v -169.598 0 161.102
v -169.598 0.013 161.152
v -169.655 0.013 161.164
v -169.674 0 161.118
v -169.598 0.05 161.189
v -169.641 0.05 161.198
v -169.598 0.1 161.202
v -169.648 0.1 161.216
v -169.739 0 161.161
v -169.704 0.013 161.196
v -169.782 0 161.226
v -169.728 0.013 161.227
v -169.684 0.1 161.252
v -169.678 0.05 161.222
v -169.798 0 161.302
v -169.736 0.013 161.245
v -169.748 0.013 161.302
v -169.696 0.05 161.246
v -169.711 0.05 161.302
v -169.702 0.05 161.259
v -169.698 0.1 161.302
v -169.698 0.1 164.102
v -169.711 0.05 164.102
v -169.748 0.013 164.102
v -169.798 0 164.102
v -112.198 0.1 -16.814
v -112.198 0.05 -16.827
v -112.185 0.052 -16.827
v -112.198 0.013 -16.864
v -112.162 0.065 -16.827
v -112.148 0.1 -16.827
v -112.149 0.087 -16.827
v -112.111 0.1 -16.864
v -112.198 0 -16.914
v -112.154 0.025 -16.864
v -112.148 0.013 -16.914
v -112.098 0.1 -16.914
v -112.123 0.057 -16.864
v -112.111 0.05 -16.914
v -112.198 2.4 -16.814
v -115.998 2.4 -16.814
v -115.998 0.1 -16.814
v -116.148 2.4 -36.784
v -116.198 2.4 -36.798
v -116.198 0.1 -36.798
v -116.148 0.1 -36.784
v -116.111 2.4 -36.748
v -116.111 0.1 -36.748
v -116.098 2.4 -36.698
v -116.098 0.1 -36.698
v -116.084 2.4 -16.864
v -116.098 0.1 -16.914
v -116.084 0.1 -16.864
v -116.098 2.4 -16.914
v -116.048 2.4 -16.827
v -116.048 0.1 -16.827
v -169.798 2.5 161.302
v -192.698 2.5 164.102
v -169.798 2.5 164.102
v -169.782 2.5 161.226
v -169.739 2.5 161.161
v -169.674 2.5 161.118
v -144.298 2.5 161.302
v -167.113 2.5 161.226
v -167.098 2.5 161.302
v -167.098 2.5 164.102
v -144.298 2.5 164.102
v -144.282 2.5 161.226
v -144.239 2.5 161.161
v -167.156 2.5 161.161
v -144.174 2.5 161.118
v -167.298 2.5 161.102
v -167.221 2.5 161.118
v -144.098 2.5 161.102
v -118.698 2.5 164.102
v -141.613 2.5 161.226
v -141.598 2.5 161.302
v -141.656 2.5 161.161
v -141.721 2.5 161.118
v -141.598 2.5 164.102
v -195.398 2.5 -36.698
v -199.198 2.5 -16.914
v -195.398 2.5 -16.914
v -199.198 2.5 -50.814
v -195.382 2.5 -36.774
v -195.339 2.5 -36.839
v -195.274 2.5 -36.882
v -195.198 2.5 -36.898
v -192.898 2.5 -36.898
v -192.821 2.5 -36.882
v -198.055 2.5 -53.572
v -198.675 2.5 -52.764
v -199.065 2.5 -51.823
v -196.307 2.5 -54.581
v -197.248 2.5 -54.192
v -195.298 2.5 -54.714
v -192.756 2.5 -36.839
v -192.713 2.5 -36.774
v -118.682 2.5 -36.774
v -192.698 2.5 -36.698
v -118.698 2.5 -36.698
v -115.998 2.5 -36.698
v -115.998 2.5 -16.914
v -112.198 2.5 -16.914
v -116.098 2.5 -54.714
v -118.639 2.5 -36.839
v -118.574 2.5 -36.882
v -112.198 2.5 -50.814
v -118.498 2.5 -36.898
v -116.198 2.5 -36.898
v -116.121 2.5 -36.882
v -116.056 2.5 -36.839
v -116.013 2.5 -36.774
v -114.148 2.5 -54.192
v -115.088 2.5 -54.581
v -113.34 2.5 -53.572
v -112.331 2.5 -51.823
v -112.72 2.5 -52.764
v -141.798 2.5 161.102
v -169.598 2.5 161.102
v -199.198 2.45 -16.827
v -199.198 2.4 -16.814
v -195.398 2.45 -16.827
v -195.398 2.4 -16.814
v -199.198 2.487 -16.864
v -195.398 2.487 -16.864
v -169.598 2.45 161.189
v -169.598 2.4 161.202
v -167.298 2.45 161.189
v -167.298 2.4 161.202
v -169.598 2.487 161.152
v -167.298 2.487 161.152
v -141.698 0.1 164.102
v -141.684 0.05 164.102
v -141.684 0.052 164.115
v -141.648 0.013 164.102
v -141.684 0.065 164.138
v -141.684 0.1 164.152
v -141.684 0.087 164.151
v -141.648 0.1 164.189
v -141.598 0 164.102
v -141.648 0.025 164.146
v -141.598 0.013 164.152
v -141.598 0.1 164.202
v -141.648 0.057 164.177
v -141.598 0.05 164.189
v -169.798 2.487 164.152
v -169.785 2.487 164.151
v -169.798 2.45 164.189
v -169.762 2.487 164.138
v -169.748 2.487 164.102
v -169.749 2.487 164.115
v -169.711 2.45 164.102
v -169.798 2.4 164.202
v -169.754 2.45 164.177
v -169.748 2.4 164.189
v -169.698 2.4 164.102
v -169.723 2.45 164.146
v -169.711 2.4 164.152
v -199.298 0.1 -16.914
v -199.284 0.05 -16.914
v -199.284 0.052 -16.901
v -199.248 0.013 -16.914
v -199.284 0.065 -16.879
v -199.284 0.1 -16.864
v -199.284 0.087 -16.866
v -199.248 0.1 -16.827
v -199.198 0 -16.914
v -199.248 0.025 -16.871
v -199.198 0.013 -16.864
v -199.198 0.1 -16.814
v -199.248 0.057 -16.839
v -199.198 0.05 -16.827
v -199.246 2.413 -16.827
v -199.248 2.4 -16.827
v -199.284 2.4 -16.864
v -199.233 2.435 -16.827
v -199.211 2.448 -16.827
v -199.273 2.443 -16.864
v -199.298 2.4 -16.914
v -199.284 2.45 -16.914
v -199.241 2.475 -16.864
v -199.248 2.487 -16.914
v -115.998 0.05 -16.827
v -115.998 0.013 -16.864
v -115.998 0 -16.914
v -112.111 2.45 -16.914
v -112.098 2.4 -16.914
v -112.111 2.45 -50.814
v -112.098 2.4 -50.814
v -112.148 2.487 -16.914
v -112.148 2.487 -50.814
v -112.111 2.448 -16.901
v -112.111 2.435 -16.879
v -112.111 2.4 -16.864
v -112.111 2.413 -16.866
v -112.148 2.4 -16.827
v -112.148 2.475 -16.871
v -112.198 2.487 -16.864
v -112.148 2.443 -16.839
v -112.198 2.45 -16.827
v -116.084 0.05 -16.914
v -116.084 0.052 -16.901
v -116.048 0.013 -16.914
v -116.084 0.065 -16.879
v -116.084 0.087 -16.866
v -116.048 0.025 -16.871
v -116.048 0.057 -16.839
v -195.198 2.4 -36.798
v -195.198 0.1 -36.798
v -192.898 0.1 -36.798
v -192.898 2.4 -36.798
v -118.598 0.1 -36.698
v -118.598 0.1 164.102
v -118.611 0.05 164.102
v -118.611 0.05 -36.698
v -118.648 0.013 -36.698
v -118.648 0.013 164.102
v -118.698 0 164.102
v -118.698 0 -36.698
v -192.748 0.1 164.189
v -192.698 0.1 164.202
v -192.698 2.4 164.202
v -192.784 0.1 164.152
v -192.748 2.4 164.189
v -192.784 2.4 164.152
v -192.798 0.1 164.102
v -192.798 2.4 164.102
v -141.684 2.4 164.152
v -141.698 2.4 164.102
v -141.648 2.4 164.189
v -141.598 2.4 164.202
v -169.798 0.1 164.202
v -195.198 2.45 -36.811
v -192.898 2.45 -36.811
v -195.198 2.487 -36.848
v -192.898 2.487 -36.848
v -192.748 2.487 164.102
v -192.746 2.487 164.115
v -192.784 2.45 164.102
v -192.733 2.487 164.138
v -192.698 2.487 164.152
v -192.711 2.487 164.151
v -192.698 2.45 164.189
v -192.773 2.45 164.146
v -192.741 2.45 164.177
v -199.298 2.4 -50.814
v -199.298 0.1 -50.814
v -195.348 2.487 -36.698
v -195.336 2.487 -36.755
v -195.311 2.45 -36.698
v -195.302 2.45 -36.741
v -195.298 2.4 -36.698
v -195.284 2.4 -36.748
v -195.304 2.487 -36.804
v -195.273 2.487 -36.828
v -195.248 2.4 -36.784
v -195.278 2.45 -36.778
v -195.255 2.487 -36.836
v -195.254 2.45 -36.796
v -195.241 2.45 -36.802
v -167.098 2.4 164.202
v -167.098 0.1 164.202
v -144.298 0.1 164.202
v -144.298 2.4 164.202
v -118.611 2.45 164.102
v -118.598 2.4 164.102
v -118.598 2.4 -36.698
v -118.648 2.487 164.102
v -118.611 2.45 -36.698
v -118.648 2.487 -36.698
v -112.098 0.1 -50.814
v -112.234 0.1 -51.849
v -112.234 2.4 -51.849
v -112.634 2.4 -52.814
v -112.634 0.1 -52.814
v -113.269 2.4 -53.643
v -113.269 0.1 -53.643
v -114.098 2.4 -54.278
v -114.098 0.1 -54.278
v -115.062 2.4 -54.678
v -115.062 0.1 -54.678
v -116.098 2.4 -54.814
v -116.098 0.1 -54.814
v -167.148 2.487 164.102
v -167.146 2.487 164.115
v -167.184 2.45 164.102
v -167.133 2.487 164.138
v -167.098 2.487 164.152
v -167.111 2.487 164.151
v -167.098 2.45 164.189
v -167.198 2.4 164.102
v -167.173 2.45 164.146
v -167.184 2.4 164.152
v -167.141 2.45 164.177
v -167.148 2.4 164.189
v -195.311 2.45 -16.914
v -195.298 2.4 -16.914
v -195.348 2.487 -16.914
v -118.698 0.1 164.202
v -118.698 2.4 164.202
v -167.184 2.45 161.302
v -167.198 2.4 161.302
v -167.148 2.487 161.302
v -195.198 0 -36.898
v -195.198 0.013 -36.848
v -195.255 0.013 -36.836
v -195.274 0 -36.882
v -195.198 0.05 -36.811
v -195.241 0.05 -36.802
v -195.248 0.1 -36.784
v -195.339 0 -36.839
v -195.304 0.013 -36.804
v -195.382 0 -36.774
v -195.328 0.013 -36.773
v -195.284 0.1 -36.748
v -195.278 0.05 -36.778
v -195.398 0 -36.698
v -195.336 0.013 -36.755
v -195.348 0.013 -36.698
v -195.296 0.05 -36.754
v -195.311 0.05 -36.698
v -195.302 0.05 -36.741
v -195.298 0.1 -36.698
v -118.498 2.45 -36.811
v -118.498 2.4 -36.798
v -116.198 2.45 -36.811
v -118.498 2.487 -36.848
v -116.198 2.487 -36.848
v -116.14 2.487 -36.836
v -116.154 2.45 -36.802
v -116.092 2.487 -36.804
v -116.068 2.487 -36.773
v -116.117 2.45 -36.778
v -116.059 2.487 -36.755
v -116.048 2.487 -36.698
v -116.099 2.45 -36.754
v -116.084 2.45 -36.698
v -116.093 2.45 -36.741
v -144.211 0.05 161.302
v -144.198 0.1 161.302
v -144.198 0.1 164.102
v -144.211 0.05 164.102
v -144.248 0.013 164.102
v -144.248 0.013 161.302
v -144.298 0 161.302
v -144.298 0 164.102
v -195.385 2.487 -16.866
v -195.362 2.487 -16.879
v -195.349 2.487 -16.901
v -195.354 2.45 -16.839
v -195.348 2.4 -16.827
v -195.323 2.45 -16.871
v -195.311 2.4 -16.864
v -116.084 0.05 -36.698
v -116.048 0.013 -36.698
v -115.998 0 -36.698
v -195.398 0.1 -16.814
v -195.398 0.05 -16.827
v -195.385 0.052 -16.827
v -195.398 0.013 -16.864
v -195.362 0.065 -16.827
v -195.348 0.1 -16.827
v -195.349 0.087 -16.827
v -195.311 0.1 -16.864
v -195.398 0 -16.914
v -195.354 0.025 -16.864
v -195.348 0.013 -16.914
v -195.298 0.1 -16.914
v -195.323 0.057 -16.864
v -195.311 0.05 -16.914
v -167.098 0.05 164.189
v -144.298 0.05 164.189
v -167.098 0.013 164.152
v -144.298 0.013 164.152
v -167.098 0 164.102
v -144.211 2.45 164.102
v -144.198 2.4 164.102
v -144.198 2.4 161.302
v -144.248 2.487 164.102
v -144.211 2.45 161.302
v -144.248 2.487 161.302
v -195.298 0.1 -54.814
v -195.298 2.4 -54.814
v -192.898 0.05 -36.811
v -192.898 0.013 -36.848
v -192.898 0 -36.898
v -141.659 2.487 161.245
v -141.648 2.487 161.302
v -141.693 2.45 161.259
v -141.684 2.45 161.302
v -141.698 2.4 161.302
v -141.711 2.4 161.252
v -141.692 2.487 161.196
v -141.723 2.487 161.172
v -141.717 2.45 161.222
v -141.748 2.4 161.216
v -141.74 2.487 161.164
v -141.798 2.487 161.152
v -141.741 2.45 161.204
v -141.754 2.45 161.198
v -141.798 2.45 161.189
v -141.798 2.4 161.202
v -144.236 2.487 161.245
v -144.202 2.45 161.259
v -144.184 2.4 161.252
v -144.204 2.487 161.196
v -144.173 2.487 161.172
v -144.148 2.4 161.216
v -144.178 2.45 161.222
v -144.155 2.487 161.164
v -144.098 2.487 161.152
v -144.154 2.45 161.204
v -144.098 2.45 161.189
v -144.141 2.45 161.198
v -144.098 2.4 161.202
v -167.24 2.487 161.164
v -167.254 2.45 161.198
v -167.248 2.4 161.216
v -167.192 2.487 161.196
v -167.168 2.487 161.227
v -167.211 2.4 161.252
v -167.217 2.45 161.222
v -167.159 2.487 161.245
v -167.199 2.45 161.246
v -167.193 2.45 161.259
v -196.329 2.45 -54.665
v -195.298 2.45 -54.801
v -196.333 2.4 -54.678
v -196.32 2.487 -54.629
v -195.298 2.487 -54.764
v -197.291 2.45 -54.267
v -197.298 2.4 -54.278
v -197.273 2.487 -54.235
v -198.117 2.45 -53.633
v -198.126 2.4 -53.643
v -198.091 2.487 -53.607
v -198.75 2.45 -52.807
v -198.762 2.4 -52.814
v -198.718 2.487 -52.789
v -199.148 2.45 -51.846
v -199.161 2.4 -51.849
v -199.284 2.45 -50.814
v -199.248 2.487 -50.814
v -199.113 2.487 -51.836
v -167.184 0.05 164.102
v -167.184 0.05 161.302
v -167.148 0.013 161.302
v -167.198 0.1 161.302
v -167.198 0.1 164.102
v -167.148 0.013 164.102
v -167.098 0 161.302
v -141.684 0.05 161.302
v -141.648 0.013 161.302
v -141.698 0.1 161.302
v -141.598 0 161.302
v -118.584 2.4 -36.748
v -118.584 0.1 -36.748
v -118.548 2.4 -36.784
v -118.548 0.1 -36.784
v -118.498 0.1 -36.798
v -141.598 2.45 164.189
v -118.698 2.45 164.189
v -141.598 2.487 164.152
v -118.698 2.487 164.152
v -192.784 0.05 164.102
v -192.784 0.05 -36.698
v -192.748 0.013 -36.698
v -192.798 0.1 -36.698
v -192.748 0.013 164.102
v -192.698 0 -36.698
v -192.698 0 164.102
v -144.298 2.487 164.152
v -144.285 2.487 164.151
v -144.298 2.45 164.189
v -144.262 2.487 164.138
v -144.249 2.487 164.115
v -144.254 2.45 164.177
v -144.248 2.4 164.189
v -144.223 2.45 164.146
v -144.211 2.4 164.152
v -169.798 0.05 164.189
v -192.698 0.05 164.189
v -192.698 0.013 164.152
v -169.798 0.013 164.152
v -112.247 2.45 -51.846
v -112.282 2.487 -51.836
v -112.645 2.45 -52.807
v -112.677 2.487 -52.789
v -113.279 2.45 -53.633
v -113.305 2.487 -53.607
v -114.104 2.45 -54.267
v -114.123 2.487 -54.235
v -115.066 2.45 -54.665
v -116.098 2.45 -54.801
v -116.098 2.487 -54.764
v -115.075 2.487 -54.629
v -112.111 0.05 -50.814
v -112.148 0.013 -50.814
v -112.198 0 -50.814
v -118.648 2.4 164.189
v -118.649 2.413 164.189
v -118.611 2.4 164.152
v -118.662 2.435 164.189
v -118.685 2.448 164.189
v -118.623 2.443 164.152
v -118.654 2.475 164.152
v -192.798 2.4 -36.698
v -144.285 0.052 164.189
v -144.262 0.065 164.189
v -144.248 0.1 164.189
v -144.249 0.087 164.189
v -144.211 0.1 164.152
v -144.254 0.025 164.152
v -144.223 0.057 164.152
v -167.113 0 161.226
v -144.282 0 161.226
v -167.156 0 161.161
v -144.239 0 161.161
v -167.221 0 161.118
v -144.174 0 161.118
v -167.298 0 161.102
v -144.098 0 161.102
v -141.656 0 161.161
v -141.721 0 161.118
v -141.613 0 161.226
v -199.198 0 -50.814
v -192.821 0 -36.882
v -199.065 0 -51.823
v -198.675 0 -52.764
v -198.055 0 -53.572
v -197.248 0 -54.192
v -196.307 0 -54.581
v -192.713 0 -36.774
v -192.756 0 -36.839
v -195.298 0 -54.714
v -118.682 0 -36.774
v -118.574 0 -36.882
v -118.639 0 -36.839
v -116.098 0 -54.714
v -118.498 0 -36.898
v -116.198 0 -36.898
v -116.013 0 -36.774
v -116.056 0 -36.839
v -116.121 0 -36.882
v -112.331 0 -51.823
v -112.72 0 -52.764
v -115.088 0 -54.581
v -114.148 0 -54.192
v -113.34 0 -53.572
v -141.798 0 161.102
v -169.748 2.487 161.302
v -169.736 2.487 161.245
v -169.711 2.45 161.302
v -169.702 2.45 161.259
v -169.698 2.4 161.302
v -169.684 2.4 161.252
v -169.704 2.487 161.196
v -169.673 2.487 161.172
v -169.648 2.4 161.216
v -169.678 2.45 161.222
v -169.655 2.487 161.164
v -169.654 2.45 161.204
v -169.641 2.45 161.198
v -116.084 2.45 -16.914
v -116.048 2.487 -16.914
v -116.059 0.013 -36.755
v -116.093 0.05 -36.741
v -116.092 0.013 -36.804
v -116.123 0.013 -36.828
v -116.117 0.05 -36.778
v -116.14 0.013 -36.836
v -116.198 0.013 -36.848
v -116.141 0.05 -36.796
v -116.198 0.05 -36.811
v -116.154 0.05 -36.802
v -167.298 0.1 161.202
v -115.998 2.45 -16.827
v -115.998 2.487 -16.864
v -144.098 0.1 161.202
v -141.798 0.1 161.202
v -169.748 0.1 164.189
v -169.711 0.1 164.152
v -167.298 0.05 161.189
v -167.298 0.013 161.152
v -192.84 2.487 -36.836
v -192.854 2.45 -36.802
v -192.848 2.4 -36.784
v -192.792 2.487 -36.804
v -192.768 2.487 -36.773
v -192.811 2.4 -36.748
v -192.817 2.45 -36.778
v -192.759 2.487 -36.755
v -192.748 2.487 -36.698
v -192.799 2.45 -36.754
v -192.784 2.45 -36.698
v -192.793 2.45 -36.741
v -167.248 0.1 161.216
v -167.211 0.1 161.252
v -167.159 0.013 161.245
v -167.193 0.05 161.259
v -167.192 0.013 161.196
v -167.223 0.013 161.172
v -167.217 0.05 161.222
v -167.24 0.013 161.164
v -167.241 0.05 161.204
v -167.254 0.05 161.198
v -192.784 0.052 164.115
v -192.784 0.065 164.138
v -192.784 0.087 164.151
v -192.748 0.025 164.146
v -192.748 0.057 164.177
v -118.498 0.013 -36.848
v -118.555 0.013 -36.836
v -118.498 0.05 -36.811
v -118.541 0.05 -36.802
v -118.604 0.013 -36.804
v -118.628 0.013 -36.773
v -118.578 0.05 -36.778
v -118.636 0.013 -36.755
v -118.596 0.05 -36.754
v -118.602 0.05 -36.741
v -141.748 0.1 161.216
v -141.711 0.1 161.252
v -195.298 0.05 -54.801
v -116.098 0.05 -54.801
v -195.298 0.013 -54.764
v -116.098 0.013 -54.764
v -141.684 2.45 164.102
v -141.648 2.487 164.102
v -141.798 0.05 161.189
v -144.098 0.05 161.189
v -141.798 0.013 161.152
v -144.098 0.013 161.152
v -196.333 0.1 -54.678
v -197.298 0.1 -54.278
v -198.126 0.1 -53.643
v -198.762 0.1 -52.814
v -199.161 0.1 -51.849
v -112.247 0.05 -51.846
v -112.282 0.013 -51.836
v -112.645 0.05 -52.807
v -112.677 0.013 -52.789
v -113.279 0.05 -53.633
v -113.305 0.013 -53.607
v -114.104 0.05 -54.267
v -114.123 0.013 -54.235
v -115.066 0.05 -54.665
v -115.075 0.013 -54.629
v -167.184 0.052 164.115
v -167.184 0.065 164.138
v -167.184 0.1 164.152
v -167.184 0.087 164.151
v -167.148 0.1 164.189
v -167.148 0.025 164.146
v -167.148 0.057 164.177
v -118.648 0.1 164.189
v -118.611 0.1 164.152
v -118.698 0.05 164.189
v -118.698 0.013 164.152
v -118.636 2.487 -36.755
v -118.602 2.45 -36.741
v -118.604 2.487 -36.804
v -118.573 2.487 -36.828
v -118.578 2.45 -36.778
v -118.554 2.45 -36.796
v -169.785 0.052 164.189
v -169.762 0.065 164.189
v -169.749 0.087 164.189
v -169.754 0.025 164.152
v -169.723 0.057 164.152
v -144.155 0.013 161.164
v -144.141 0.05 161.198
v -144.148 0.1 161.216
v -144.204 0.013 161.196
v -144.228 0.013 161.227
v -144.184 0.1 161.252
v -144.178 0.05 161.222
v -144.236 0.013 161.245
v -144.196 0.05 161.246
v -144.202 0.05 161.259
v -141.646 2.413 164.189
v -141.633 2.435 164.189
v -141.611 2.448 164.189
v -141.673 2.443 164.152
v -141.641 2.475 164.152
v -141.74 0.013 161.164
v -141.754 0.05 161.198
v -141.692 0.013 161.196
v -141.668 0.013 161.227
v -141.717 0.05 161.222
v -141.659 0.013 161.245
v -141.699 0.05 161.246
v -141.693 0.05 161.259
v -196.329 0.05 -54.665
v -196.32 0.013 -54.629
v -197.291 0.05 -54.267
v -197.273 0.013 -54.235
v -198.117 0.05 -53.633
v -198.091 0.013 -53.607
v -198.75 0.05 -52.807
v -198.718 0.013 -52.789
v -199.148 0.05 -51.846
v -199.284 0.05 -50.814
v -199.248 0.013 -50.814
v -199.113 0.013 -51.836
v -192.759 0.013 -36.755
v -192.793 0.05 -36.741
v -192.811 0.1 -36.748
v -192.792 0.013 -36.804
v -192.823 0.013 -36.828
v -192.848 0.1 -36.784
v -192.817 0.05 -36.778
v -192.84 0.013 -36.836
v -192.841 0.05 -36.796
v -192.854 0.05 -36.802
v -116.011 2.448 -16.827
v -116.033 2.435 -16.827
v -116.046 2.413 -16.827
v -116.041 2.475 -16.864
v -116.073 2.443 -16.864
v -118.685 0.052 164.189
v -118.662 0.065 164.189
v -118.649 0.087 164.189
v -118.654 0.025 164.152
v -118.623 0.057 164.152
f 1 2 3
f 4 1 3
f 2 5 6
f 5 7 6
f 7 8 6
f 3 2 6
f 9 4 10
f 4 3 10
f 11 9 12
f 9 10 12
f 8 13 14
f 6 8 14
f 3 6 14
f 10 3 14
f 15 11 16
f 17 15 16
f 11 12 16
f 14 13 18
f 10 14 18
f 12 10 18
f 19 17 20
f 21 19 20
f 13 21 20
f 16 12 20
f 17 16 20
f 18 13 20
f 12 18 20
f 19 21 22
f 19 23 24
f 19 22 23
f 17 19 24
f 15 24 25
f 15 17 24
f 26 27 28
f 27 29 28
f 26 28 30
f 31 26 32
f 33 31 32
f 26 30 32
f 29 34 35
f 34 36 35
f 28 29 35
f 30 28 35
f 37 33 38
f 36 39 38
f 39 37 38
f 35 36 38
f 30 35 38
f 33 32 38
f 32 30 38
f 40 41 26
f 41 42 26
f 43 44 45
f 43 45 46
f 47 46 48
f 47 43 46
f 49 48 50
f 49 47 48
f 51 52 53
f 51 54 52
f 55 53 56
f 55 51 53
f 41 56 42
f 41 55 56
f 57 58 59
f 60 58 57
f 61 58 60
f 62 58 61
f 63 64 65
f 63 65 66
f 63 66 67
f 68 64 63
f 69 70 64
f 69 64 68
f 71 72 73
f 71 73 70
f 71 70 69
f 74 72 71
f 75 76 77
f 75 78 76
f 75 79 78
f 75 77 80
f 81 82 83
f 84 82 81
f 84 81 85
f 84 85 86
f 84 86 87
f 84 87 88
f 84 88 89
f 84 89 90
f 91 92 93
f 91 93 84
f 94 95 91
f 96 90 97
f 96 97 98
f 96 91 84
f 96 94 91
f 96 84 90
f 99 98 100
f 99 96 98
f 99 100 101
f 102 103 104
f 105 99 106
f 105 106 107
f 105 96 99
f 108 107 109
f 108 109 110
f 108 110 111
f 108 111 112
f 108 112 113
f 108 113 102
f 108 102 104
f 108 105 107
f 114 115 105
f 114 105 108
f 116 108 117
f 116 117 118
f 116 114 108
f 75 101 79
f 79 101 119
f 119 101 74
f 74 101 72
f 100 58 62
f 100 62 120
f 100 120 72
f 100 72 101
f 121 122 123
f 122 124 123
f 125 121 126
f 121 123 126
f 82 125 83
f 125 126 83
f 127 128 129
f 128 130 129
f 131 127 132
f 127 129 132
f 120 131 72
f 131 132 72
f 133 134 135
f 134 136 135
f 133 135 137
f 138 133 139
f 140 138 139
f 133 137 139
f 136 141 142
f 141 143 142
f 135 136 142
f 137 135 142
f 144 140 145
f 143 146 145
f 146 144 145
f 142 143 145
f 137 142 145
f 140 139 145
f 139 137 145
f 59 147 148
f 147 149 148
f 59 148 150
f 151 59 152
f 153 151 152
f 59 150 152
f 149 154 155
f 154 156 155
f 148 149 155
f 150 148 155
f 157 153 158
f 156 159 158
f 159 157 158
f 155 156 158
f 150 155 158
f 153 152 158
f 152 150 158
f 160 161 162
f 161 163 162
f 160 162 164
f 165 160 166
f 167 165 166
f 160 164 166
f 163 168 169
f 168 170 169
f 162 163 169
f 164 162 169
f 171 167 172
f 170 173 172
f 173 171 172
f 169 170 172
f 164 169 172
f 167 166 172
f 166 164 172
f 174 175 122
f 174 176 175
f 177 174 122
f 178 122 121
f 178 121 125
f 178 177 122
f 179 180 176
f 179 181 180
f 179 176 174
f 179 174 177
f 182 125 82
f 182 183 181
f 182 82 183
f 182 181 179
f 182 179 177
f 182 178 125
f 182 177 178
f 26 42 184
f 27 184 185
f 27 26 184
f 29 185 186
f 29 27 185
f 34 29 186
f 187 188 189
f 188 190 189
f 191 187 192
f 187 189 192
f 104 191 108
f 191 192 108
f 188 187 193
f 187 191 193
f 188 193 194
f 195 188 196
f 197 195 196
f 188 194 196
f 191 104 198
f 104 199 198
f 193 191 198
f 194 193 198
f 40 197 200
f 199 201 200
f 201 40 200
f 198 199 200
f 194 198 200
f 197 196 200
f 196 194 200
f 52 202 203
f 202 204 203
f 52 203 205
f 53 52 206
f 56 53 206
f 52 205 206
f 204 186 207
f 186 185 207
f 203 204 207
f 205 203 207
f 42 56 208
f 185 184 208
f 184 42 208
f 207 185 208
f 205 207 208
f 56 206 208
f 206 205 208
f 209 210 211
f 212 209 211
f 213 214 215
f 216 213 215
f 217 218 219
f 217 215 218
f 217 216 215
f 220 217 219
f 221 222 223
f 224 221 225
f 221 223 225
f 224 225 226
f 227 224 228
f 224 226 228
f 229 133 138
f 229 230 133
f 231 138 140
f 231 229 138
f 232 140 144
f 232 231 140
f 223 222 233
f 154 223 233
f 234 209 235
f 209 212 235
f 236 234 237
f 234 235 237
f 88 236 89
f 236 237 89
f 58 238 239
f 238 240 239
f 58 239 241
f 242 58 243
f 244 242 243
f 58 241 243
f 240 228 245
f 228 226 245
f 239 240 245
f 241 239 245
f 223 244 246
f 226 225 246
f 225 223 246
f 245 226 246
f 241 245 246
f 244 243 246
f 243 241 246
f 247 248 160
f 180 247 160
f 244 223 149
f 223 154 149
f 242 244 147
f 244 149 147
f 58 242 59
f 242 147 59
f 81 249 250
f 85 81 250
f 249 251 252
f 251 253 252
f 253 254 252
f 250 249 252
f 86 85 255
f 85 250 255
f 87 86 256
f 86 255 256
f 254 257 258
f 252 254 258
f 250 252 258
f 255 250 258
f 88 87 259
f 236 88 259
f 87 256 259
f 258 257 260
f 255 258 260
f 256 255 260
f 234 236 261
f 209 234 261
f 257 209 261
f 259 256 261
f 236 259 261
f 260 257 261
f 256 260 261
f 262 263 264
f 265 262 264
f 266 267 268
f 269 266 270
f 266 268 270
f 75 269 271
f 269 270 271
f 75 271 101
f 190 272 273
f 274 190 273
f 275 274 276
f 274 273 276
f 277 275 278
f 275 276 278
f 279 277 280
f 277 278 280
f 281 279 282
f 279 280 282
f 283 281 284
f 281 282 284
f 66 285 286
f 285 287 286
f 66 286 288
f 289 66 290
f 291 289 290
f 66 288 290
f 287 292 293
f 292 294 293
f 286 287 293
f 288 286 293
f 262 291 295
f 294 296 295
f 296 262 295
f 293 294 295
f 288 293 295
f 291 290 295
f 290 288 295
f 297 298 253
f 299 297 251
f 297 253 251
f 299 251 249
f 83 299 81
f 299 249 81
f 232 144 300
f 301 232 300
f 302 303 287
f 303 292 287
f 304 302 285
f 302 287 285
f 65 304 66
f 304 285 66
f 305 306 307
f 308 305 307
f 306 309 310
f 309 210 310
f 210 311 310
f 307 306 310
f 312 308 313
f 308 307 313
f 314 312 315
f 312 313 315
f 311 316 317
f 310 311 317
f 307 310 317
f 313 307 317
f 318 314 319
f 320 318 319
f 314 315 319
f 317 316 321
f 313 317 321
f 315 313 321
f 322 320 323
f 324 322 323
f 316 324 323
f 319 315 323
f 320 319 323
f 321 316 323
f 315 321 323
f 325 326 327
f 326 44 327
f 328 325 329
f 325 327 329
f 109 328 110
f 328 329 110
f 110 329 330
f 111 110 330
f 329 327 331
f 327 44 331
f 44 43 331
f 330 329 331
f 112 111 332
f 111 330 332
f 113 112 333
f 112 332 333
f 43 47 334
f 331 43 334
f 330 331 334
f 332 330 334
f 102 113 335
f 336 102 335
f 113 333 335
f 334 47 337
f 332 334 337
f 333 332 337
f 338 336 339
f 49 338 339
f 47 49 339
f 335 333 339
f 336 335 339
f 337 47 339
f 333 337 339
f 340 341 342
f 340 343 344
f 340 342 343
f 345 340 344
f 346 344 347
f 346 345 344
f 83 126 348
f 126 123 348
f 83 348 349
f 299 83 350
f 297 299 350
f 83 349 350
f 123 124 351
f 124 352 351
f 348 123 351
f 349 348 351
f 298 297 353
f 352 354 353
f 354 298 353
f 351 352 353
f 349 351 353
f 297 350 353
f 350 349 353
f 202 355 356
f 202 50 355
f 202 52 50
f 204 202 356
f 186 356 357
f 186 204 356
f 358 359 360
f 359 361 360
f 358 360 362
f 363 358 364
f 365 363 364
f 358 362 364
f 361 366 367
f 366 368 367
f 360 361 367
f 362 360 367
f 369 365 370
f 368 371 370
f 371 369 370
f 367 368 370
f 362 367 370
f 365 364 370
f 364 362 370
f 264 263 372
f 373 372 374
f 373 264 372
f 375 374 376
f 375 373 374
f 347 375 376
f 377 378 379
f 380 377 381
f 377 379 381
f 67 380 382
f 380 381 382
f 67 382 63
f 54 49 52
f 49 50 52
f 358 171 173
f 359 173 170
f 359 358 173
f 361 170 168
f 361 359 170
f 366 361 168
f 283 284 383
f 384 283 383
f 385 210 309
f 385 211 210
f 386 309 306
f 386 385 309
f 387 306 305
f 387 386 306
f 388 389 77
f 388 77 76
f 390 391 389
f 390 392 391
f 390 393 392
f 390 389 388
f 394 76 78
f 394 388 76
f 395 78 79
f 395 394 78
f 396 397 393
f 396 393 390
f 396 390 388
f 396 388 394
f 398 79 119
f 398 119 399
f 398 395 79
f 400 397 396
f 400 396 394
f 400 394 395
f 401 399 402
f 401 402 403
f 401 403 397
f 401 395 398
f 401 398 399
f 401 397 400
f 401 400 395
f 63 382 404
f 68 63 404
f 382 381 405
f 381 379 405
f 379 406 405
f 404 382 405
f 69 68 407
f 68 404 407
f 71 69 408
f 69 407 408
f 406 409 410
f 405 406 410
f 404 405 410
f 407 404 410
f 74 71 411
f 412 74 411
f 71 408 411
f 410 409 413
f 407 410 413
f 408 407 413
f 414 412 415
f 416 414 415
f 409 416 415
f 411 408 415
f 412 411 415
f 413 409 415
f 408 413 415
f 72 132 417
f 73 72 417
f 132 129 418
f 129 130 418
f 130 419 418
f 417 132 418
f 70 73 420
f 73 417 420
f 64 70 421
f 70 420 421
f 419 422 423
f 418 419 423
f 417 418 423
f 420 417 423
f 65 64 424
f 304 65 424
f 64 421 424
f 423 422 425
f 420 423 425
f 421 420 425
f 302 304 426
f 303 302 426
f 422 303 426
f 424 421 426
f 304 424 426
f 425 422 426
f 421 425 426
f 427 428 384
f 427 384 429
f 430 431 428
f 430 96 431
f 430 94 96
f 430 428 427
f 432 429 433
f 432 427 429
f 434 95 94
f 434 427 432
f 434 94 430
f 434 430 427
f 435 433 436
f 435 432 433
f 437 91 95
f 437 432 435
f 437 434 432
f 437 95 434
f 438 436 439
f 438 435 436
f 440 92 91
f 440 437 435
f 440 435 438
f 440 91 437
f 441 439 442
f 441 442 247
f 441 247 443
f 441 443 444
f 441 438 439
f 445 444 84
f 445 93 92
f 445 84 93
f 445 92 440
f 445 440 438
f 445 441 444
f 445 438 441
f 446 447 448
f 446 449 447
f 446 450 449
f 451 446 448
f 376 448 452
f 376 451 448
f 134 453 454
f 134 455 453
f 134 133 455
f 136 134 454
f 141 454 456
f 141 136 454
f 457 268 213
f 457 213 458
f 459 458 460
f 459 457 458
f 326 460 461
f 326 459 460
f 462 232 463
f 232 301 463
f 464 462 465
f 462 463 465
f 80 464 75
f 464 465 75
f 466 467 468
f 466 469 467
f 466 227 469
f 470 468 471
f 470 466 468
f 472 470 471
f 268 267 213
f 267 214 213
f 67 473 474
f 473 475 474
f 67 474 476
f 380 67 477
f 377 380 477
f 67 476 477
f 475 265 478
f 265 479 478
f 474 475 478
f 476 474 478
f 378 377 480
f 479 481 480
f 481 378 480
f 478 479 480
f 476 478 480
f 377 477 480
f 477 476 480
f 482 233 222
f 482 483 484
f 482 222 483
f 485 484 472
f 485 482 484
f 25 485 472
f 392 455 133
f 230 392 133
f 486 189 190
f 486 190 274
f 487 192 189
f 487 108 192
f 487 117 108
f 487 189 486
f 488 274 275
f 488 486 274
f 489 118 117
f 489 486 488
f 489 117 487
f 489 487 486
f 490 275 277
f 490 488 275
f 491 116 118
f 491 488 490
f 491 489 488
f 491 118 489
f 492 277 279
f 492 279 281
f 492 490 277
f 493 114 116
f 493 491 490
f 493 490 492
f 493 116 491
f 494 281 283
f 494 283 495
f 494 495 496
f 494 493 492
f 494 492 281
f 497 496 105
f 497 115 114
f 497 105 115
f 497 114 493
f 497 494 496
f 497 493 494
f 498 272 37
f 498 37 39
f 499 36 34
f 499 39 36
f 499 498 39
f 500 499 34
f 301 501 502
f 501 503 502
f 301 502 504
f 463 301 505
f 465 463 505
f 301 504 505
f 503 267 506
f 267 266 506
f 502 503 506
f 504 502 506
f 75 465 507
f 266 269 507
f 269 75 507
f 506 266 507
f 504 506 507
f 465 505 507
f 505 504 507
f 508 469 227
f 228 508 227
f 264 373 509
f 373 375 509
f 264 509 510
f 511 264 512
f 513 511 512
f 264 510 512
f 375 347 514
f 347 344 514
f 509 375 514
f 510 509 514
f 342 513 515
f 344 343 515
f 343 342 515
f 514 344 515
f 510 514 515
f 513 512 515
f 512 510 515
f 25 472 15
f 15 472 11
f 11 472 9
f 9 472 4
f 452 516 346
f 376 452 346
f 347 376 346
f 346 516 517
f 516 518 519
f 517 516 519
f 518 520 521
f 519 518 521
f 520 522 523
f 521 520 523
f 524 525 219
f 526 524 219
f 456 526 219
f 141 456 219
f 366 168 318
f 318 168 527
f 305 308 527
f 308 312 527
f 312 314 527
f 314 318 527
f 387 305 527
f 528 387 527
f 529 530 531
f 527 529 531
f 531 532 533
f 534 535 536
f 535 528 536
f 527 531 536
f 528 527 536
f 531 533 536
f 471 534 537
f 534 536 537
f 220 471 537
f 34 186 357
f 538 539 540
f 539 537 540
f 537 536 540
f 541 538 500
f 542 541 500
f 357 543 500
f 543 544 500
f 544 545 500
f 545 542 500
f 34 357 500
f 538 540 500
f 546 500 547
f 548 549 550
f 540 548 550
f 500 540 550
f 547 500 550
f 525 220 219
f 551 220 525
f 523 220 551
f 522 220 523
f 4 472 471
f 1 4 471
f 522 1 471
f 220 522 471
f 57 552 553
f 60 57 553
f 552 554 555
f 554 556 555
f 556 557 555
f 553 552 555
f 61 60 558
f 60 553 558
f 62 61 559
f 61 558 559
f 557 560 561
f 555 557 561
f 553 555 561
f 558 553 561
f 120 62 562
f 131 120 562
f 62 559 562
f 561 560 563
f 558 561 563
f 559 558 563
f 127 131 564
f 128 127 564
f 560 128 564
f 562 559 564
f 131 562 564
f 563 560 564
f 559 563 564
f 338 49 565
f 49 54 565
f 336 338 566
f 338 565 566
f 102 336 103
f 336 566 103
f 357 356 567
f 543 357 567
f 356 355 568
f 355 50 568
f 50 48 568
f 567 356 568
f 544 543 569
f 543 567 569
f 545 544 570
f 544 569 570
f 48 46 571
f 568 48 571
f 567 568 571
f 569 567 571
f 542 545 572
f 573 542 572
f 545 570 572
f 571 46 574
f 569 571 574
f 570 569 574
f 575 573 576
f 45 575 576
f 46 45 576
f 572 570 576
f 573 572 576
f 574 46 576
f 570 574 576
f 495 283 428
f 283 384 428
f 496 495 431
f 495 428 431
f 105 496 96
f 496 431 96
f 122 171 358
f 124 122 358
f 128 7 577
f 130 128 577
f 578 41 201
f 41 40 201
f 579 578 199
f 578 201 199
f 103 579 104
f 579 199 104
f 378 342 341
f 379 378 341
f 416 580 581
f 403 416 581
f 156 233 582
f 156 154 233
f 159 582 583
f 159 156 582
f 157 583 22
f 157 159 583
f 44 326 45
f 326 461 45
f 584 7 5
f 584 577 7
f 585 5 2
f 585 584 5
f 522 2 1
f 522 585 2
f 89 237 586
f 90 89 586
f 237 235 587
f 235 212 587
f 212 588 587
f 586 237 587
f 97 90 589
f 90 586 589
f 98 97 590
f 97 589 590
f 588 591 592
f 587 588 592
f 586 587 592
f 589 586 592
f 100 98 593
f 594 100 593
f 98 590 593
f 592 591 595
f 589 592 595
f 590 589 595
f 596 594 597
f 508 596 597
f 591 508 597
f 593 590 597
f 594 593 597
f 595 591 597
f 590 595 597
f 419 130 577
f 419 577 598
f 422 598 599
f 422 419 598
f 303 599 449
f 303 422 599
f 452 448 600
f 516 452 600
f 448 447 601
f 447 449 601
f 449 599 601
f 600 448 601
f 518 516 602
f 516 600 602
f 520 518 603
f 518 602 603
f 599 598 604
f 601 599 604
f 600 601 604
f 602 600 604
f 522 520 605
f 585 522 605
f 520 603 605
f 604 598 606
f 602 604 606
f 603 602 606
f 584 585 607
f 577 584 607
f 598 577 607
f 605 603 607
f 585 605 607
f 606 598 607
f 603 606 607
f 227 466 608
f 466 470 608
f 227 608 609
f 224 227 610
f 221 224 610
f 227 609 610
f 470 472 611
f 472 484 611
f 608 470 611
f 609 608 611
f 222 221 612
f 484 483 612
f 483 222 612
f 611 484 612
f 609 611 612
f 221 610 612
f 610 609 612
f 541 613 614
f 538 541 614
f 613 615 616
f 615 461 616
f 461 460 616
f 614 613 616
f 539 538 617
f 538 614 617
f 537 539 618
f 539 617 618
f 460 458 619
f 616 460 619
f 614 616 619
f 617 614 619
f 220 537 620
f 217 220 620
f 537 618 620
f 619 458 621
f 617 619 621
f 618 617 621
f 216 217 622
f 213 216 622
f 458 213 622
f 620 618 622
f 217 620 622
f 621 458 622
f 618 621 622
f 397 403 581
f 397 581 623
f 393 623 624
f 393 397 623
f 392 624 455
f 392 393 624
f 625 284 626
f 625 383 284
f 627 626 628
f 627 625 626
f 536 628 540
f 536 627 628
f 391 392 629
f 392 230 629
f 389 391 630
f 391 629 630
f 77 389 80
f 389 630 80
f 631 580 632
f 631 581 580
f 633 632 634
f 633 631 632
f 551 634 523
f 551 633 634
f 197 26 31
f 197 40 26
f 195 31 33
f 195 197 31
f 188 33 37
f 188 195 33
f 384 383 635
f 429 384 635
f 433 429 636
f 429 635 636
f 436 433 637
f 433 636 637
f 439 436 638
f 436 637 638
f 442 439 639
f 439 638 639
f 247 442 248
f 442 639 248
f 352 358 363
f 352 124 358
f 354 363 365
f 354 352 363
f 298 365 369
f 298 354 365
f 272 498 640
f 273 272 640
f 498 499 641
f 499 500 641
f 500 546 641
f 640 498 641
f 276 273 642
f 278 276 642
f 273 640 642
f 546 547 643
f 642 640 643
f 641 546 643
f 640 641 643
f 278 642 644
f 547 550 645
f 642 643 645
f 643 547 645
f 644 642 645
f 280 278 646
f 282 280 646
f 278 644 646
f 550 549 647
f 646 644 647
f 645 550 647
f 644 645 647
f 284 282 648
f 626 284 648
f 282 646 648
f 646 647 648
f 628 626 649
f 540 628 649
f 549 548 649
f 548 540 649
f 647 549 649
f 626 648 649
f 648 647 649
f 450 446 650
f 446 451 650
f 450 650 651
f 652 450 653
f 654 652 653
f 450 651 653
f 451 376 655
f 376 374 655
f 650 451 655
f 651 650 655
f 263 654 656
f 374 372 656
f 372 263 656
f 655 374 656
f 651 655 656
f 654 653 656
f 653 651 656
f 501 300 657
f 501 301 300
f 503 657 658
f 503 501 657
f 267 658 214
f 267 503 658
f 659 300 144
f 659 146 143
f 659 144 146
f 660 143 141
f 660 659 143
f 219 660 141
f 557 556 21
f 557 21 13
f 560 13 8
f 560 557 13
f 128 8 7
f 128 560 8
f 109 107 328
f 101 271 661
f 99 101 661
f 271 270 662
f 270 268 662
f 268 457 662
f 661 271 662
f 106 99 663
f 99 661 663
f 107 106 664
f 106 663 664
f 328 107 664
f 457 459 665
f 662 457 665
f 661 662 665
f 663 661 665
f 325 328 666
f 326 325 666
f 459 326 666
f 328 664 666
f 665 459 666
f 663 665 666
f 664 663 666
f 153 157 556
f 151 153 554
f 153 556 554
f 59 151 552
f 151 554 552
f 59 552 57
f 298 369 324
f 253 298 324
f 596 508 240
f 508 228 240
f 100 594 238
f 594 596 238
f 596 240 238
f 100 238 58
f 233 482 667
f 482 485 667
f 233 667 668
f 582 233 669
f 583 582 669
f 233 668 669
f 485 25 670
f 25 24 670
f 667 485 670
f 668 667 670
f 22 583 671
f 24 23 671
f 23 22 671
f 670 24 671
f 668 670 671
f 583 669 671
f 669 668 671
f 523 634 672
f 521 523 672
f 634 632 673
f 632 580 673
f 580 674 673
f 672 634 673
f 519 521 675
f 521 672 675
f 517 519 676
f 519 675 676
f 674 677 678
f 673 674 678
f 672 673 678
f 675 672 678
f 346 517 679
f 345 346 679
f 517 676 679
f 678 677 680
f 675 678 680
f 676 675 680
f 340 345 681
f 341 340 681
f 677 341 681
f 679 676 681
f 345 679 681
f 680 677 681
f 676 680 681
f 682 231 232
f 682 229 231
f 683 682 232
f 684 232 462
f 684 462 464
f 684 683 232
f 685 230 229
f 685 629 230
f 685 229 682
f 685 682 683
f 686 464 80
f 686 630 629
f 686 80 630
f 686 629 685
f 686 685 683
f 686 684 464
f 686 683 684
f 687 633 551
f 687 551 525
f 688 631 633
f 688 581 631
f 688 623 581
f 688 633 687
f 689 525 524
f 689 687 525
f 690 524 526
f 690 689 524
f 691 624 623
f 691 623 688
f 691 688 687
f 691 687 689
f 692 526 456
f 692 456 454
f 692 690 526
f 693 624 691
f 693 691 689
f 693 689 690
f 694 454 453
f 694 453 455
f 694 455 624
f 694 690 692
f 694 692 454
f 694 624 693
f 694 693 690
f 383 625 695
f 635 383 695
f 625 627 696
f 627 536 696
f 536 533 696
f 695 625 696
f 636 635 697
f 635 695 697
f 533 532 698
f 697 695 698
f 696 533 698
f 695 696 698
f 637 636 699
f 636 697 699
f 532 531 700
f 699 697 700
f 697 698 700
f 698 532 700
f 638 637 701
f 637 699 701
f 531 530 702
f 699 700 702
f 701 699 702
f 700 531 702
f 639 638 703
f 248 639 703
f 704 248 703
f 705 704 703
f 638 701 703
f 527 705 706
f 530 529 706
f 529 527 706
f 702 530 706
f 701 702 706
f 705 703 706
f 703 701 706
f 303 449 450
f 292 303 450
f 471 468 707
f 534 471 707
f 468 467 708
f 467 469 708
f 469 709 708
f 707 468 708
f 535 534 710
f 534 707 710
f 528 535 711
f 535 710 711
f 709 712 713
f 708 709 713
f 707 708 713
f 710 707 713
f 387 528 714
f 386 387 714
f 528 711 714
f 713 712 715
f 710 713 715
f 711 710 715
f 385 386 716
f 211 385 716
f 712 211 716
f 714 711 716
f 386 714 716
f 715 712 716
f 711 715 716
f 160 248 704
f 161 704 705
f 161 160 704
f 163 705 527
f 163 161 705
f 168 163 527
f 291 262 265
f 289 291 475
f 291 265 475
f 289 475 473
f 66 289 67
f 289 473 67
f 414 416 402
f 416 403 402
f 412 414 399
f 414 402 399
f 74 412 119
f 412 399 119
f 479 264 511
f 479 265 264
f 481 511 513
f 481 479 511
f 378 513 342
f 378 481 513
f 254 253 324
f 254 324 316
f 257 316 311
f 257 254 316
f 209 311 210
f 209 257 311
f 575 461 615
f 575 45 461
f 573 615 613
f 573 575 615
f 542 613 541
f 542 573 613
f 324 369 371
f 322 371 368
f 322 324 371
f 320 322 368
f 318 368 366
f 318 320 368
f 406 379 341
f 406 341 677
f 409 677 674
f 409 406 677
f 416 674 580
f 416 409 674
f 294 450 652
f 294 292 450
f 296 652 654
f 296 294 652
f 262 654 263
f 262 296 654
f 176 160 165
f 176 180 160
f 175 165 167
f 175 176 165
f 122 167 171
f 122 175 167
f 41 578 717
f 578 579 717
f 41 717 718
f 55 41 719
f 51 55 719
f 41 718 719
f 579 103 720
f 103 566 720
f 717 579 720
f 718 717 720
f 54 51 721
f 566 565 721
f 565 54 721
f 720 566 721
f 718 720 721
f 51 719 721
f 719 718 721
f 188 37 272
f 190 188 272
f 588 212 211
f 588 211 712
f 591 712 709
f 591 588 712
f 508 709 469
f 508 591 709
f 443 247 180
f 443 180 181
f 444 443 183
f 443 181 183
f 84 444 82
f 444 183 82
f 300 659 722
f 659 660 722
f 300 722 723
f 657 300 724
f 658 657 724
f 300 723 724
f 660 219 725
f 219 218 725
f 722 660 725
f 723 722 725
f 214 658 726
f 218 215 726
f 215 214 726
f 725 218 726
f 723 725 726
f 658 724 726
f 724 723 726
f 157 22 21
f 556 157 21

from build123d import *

# Parameters (mm, degrees)
ESBO_O1_W                = 74.2
ESBO_O1_H                = 19.98362215
RESSALTO_EXTRUS_O1_DEPTH = 2.5
FILETE1_R                = 0.1


with BuildPart() as part:
    # Esboço1 → Ressalto-extrusão1 (new body)
    with BuildSketch(Plane(origin=(0, 0, 0), x_dir=(1, 0, 0), z_dir=(0, 1, 0))):
        Polygon((-118.597641475, 16.814088048), (-192.797641475, 16.814088048), (-192.797641475, -164.202289802), (-169.697641475, -164.202289802), (-169.697641475, -161.202289802), (-167.197641475, -161.202289802), (-167.197641475, -164.202289802), (-144.197641475, -164.202289802), (-144.197641475, -161.202289802), (-141.697641475, -161.202289802), (-141.697641475, -164.202289802), (-118.597641475, -164.202289802), align=None)
        with Locations((-155.697641475, 26.805899123)):
            Rectangle(ESBO_O1_W, ESBO_O1_H)
        with BuildLine():
            Line((-195.297641475, 36.797710198), (-192.797641475, 36.797710198))
            Line((-192.797641475, 36.797710198), (-118.597641475, 36.797710198))
            Line((-118.597641475, 36.797710198), (-116.097641475, 36.797710198))
            Line((-116.097641475, 36.797710198), (-116.097641475, 16.814088048))
            Line((-116.097641475, 16.814088048), (-112.097641475, 16.814088048))
            Line((-112.097641475, 16.814088048), (-112.097641475, 50.814088048))
            ThreePointArc((-112.097641475, 50.814088048), (-113.26921435, 53.642515173), (-116.097641475, 54.814088048))
            Line((-116.097641475, 54.814088048), (-195.297641475, 54.814088048))
            ThreePointArc((-195.297641475, 54.814088048), (-198.126068599, 53.642515173), (-199.297641475, 50.814088048))
            Line((-199.297641475, 50.814088048), (-199.297641475, 16.814088048))
            Line((-199.297641475, 16.814088048), (-195.297641475, 16.814088048))
            Line((-195.297641475, 16.814088048), (-195.297641475, 36.797710198))
        make_face()
    extrude(amount=RESSALTO_EXTRUS_O1_DEPTH)

    # Filete1
    filete1_edges = [part.edges().sort_by_distance(p)[0] for p in [
        (-118.597641475, 2.5, 63.702289802),
        (-117.347641475, 2.5, -36.797710198),
        (-142.947641475, 0, 161.202289802),
        (-144.197641475, 0, 162.702289802),
        (-155.697641475, 0, 164.202289802),
        (-167.197641475, 0, 162.702289802),
        (-168.447641475, 0, 161.202289802),
        (-116.097641475, 2.5, -26.805899123),
        (-169.697641475, 0, 162.702289802),
        (-181.247641475, 0, 164.202289802),
        (-192.797641475, 0, 63.702289802),
        (-194.047641475, 0, -36.797710198),
        (-195.297641475, 0, -26.805899123),
        (-197.297641475, 0, -16.814088048),
        (-199.297641475, 0, -33.814088048),
        (-114.097641475, 2.5, -16.814088048),
        (-198.126068599, 0, -53.642515173),
        (-155.697641475, 0, -54.814088048),
        (-113.26921435, 0, -53.642515173),
        (-112.097641475, 0, -33.814088048),
        (-114.097641475, 0, -16.814088048),
        (-116.097641475, 0, -26.805899123),
        (-117.347641475, 0, -36.797710198),
        (-118.597641475, 0, 63.702289802),
        (-112.097641475, 2.5, -33.814088048),
        (-130.147641475, 0, 164.202289802),
        (-141.697641475, 0, 162.702289802),
        (-113.26921435, 2.5, -53.642515173),
        (-141.697641475, 1.25, 161.202289802),
        (-144.197641475, 1.25, 161.202289802),
        (-141.697641475, 2.5, 162.702289802),
        (-155.697641475, 2.5, -54.814088048),
        (-144.197641475, 1.25, 164.202289802),
        (-167.197641475, 1.25, 164.202289802),
        (-167.197641475, 1.25, 161.202289802),
        (-169.697641475, 1.25, 161.202289802),
        (-169.697641475, 1.25, 164.202289802),
        (-192.797641475, 1.25, 164.202289802),
        (-192.797641475, 1.25, -36.797710198),
        (-195.297641475, 1.25, -36.797710198),
        (-195.297641475, 1.25, -16.814088048),
        (-199.297641475, 1.25, -16.814088048),
        (-112.097641475, 1.25, -16.814088048),
        (-116.097641475, 1.25, -16.814088048),
        (-116.097641475, 1.25, -36.797710198),
        (-118.597641475, 1.25, -36.797710198),
        (-118.597641475, 1.25, 164.202289802),
        (-141.697641475, 1.25, 164.202289802),
        (-198.126068599, 2.5, -53.642515173),
        (-199.297641475, 2.5, -33.814088048),
        (-197.297641475, 2.5, -16.814088048),
        (-195.297641475, 2.5, -26.805899123),
        (-194.047641475, 2.5, -36.797710198),
        (-192.797641475, 2.5, 63.702289802),
        (-181.247641475, 2.5, 164.202289802),
        (-169.697641475, 2.5, 162.702289802),
        (-168.447641475, 2.5, 161.202289802),
        (-130.147641475, 2.5, 164.202289802),
        (-167.197641475, 2.5, 162.702289802),
        (-155.697641475, 2.5, 164.202289802),
        (-144.197641475, 2.5, 162.702289802),
        (-142.947641475, 2.5, 161.202289802),
    ]]
    fillet(filete1_edges, radius=FILETE1_R)


solid = part.part
